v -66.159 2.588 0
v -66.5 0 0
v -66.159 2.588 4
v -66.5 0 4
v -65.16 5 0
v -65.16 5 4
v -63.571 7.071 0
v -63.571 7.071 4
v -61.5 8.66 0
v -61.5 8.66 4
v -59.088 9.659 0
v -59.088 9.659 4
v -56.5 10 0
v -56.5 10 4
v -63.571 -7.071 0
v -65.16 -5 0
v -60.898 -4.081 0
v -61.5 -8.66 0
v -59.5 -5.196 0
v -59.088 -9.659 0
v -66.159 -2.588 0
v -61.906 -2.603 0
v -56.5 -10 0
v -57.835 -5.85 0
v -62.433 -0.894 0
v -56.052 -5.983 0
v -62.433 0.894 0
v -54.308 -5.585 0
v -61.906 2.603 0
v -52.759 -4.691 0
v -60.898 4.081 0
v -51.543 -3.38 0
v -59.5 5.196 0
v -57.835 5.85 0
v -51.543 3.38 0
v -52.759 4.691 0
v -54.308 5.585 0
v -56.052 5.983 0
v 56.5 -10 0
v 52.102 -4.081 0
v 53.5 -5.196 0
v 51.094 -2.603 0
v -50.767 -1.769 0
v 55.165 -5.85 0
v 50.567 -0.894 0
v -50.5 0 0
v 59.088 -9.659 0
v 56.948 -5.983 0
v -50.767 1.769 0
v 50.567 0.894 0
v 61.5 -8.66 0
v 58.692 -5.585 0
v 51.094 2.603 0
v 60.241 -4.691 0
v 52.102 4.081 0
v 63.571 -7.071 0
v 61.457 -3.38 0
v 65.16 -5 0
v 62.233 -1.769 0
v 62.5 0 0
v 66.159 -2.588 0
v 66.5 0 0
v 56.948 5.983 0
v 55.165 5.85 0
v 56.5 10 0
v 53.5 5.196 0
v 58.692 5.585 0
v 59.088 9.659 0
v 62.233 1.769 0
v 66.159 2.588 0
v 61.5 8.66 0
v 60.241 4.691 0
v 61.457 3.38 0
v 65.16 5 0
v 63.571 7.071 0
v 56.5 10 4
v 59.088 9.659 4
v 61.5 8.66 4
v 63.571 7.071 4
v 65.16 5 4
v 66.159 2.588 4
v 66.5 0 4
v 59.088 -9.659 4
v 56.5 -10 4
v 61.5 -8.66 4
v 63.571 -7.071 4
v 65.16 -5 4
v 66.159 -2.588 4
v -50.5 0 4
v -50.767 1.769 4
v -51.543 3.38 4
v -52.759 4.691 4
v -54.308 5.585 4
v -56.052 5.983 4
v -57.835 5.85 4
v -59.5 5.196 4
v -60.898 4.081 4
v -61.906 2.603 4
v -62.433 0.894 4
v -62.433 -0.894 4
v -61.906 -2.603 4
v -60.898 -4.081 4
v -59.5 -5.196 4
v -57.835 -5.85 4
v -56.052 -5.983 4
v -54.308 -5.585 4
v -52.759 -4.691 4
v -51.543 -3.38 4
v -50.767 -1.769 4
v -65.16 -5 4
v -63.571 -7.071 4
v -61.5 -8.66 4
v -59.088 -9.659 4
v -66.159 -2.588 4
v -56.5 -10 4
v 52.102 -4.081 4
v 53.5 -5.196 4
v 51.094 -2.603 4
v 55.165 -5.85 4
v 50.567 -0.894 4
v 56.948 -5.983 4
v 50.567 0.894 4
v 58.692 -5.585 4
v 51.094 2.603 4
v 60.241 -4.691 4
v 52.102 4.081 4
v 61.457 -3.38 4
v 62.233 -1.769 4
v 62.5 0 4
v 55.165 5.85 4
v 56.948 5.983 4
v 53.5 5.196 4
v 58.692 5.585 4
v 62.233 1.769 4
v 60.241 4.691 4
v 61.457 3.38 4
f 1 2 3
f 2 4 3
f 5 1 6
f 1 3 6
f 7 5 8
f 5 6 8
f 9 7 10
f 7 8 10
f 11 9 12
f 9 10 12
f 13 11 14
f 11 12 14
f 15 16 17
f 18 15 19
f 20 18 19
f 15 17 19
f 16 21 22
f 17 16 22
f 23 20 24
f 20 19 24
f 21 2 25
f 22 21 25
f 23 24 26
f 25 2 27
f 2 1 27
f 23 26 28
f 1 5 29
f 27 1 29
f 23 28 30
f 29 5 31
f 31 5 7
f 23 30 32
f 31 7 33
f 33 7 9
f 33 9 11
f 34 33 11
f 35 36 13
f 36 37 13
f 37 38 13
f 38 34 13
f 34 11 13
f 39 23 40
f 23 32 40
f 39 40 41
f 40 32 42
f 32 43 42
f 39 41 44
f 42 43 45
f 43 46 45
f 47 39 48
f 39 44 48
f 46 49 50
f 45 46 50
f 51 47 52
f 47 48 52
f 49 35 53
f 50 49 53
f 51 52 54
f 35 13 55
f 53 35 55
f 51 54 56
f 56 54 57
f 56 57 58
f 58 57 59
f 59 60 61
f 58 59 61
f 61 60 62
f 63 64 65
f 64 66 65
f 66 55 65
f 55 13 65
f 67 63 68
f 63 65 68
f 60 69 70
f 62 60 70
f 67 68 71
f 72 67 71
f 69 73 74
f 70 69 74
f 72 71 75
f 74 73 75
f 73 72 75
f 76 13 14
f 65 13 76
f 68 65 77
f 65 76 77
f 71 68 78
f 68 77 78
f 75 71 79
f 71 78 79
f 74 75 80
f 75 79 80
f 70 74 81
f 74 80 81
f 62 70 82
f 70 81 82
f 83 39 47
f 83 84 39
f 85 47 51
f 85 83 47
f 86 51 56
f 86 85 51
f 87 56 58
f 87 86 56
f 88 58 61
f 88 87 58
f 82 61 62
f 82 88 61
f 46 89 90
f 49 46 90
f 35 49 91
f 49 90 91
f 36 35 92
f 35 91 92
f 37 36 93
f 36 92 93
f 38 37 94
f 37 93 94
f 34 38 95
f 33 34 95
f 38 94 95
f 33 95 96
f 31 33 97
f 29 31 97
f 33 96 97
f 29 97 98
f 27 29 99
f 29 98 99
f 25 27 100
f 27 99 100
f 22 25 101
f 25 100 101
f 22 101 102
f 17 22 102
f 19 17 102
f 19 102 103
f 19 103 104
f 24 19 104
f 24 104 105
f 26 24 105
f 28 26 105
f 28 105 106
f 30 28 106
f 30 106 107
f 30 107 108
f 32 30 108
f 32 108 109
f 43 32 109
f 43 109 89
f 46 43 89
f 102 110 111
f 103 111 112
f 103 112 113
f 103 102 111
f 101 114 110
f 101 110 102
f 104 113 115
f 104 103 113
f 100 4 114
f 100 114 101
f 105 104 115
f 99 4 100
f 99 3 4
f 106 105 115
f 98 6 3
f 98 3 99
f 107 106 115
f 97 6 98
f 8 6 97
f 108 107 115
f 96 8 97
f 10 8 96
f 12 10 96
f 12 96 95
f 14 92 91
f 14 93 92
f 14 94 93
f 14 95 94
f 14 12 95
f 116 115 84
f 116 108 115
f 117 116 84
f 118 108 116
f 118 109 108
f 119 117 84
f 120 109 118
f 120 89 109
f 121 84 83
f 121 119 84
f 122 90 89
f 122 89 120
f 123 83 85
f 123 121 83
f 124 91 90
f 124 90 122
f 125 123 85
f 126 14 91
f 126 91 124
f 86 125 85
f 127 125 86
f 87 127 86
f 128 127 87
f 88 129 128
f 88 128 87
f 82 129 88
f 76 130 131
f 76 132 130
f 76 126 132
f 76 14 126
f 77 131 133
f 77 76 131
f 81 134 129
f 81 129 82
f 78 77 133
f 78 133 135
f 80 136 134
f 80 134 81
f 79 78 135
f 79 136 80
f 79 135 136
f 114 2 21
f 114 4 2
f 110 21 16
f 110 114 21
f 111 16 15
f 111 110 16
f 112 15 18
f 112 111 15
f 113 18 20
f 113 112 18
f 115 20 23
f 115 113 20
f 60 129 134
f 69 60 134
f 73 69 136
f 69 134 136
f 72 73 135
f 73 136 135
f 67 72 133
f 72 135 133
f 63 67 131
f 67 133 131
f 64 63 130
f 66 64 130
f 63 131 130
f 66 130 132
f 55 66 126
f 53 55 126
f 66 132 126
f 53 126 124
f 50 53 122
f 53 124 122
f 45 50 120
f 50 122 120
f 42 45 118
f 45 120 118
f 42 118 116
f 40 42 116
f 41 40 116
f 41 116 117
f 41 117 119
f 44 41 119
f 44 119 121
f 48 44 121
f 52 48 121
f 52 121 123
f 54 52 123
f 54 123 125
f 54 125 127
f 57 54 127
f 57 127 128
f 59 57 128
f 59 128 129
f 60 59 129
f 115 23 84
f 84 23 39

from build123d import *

# Parameters (mm, degrees)
F0_W     = 133
F0_H     = 20
F1_DEPTH = 4
F2_R     = 6
F3_DEPTH = 4.001
F4_R     = 9.99999


# Not quite as in the source:
# - a fillet or chamfer is up to 0.001 mm smaller than in the source, because OpenCascade refuses the exact size


with BuildPart() as f1:
    # F0 (on Top) → F1 (new body)
    with BuildSketch(Plane.XY):
        Rectangle(F0_W, F0_H)
    extrude(amount=F1_DEPTH)

    # F2 (on face) → F3 (cut, through all)
    with BuildSketch(Plane.XY.offset(4)):
        with Locations((-56.5, 0)):
            Circle(F2_R)
        with Locations((56.5, 0)):
            Circle(F2_R)
    extrude(amount=-F3_DEPTH, mode=Mode.SUBTRACT)

    # F4 (radius 10 in the source; OpenCascade refuses exactly that, so slightly less here)
    f4_edges = [f1.edges().sort_by_distance(p)[0] for p in [
        (-66.5, -10, 2),
        (-66.5, 10, 2),
        (66.5, -10, 2),
        (66.5, 10, 2),
    ]]
    fillet(f4_edges, radius=F4_R)


solid = f1.part
